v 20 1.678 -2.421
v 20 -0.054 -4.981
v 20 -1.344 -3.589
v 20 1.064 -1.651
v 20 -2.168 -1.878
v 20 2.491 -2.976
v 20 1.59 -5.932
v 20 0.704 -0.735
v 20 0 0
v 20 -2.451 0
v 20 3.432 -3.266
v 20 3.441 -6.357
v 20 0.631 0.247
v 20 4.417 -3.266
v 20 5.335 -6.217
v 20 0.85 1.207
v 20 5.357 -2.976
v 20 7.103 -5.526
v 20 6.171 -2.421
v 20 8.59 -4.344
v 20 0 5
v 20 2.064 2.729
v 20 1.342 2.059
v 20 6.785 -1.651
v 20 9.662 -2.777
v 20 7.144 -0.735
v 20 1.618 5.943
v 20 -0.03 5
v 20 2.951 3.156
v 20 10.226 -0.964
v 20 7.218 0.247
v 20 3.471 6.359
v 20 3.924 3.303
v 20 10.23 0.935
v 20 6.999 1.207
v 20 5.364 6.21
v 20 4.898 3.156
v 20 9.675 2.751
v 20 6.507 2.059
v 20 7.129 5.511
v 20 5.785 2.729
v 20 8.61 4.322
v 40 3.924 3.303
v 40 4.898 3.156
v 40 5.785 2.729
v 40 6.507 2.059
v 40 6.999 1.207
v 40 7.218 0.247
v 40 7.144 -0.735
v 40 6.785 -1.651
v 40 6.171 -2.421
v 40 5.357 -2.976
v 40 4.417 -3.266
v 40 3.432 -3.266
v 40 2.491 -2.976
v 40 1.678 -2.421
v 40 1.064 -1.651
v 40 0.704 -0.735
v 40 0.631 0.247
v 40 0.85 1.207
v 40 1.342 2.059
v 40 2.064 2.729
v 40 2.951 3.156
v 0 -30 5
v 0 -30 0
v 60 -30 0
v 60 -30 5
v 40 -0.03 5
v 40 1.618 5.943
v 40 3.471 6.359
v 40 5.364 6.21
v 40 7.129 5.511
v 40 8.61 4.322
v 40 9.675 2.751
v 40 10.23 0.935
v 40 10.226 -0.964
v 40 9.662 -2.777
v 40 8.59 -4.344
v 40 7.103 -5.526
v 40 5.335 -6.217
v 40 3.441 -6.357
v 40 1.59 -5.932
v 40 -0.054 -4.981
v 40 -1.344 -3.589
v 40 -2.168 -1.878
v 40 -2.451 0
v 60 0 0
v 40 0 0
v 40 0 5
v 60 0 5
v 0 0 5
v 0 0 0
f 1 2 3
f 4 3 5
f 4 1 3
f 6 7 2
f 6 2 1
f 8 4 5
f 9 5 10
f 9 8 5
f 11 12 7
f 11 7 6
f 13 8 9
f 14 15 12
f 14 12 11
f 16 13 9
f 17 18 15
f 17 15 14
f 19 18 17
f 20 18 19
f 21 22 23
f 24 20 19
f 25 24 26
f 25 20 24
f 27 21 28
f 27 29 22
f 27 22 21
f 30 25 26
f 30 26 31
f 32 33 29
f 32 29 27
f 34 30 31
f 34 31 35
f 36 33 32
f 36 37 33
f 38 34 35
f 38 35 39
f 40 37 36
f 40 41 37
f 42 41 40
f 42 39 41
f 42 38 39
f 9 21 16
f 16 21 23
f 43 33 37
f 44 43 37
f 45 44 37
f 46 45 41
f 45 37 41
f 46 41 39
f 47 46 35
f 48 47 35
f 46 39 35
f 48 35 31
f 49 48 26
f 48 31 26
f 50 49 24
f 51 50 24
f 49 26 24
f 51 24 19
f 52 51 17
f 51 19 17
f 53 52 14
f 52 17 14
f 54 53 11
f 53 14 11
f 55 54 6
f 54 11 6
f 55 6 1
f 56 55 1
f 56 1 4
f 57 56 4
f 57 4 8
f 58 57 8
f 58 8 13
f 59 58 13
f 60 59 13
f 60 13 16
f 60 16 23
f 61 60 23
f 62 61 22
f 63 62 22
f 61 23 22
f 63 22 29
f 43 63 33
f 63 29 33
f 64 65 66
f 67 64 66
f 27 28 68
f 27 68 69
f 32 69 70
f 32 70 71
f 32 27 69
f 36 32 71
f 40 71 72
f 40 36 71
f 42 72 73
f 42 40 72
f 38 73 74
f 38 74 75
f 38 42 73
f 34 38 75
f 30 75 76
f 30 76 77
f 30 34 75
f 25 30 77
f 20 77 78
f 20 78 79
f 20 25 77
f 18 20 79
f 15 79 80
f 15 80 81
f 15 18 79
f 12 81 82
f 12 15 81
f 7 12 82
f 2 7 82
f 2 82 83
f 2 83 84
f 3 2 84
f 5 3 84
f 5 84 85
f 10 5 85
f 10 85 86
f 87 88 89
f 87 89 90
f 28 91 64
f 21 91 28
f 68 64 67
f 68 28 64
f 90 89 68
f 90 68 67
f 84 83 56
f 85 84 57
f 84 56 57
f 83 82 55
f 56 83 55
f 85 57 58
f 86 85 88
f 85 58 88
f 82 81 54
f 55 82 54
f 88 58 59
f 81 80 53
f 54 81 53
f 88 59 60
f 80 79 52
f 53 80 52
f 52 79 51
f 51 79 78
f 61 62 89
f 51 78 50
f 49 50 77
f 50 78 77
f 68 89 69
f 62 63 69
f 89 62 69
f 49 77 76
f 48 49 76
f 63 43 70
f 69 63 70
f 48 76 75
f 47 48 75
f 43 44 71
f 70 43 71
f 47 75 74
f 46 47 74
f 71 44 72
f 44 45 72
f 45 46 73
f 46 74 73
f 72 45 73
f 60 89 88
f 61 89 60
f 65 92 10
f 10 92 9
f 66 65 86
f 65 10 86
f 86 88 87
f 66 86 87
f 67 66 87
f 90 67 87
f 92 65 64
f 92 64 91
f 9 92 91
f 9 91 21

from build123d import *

# Parameters (mm, degrees)
SKETCH1_W           = 60
SKETCH1_H           = 30
BOSS_EXTRUDE1_DEPTH = 5
SKETCH6_R           = 6.374885251
SKETCH6_R_2         = 3.302926723
BOSS_EXTRUDE5_DEPTH = 20


with BuildPart() as part:
    # Sketch1 → Boss-Extrude1 (new body)
    with BuildSketch(Plane.XY):
        with Locations((30, -15)):
            Rectangle(SKETCH1_W, SKETCH1_H)
    extrude(amount=BOSS_EXTRUDE1_DEPTH)

    # Sketch6 → Boss-Extrude5 (add)
    with BuildSketch(Plane.ZY.offset(-20)):
        with Locations((0, 3.924359496)):
            Circle(SKETCH6_R)
        with Locations((0, 3.924359496)):
            Circle(SKETCH6_R_2, mode=Mode.SUBTRACT)
    extrude(amount=-BOSS_EXTRUDE5_DEPTH)


solid = part.part
